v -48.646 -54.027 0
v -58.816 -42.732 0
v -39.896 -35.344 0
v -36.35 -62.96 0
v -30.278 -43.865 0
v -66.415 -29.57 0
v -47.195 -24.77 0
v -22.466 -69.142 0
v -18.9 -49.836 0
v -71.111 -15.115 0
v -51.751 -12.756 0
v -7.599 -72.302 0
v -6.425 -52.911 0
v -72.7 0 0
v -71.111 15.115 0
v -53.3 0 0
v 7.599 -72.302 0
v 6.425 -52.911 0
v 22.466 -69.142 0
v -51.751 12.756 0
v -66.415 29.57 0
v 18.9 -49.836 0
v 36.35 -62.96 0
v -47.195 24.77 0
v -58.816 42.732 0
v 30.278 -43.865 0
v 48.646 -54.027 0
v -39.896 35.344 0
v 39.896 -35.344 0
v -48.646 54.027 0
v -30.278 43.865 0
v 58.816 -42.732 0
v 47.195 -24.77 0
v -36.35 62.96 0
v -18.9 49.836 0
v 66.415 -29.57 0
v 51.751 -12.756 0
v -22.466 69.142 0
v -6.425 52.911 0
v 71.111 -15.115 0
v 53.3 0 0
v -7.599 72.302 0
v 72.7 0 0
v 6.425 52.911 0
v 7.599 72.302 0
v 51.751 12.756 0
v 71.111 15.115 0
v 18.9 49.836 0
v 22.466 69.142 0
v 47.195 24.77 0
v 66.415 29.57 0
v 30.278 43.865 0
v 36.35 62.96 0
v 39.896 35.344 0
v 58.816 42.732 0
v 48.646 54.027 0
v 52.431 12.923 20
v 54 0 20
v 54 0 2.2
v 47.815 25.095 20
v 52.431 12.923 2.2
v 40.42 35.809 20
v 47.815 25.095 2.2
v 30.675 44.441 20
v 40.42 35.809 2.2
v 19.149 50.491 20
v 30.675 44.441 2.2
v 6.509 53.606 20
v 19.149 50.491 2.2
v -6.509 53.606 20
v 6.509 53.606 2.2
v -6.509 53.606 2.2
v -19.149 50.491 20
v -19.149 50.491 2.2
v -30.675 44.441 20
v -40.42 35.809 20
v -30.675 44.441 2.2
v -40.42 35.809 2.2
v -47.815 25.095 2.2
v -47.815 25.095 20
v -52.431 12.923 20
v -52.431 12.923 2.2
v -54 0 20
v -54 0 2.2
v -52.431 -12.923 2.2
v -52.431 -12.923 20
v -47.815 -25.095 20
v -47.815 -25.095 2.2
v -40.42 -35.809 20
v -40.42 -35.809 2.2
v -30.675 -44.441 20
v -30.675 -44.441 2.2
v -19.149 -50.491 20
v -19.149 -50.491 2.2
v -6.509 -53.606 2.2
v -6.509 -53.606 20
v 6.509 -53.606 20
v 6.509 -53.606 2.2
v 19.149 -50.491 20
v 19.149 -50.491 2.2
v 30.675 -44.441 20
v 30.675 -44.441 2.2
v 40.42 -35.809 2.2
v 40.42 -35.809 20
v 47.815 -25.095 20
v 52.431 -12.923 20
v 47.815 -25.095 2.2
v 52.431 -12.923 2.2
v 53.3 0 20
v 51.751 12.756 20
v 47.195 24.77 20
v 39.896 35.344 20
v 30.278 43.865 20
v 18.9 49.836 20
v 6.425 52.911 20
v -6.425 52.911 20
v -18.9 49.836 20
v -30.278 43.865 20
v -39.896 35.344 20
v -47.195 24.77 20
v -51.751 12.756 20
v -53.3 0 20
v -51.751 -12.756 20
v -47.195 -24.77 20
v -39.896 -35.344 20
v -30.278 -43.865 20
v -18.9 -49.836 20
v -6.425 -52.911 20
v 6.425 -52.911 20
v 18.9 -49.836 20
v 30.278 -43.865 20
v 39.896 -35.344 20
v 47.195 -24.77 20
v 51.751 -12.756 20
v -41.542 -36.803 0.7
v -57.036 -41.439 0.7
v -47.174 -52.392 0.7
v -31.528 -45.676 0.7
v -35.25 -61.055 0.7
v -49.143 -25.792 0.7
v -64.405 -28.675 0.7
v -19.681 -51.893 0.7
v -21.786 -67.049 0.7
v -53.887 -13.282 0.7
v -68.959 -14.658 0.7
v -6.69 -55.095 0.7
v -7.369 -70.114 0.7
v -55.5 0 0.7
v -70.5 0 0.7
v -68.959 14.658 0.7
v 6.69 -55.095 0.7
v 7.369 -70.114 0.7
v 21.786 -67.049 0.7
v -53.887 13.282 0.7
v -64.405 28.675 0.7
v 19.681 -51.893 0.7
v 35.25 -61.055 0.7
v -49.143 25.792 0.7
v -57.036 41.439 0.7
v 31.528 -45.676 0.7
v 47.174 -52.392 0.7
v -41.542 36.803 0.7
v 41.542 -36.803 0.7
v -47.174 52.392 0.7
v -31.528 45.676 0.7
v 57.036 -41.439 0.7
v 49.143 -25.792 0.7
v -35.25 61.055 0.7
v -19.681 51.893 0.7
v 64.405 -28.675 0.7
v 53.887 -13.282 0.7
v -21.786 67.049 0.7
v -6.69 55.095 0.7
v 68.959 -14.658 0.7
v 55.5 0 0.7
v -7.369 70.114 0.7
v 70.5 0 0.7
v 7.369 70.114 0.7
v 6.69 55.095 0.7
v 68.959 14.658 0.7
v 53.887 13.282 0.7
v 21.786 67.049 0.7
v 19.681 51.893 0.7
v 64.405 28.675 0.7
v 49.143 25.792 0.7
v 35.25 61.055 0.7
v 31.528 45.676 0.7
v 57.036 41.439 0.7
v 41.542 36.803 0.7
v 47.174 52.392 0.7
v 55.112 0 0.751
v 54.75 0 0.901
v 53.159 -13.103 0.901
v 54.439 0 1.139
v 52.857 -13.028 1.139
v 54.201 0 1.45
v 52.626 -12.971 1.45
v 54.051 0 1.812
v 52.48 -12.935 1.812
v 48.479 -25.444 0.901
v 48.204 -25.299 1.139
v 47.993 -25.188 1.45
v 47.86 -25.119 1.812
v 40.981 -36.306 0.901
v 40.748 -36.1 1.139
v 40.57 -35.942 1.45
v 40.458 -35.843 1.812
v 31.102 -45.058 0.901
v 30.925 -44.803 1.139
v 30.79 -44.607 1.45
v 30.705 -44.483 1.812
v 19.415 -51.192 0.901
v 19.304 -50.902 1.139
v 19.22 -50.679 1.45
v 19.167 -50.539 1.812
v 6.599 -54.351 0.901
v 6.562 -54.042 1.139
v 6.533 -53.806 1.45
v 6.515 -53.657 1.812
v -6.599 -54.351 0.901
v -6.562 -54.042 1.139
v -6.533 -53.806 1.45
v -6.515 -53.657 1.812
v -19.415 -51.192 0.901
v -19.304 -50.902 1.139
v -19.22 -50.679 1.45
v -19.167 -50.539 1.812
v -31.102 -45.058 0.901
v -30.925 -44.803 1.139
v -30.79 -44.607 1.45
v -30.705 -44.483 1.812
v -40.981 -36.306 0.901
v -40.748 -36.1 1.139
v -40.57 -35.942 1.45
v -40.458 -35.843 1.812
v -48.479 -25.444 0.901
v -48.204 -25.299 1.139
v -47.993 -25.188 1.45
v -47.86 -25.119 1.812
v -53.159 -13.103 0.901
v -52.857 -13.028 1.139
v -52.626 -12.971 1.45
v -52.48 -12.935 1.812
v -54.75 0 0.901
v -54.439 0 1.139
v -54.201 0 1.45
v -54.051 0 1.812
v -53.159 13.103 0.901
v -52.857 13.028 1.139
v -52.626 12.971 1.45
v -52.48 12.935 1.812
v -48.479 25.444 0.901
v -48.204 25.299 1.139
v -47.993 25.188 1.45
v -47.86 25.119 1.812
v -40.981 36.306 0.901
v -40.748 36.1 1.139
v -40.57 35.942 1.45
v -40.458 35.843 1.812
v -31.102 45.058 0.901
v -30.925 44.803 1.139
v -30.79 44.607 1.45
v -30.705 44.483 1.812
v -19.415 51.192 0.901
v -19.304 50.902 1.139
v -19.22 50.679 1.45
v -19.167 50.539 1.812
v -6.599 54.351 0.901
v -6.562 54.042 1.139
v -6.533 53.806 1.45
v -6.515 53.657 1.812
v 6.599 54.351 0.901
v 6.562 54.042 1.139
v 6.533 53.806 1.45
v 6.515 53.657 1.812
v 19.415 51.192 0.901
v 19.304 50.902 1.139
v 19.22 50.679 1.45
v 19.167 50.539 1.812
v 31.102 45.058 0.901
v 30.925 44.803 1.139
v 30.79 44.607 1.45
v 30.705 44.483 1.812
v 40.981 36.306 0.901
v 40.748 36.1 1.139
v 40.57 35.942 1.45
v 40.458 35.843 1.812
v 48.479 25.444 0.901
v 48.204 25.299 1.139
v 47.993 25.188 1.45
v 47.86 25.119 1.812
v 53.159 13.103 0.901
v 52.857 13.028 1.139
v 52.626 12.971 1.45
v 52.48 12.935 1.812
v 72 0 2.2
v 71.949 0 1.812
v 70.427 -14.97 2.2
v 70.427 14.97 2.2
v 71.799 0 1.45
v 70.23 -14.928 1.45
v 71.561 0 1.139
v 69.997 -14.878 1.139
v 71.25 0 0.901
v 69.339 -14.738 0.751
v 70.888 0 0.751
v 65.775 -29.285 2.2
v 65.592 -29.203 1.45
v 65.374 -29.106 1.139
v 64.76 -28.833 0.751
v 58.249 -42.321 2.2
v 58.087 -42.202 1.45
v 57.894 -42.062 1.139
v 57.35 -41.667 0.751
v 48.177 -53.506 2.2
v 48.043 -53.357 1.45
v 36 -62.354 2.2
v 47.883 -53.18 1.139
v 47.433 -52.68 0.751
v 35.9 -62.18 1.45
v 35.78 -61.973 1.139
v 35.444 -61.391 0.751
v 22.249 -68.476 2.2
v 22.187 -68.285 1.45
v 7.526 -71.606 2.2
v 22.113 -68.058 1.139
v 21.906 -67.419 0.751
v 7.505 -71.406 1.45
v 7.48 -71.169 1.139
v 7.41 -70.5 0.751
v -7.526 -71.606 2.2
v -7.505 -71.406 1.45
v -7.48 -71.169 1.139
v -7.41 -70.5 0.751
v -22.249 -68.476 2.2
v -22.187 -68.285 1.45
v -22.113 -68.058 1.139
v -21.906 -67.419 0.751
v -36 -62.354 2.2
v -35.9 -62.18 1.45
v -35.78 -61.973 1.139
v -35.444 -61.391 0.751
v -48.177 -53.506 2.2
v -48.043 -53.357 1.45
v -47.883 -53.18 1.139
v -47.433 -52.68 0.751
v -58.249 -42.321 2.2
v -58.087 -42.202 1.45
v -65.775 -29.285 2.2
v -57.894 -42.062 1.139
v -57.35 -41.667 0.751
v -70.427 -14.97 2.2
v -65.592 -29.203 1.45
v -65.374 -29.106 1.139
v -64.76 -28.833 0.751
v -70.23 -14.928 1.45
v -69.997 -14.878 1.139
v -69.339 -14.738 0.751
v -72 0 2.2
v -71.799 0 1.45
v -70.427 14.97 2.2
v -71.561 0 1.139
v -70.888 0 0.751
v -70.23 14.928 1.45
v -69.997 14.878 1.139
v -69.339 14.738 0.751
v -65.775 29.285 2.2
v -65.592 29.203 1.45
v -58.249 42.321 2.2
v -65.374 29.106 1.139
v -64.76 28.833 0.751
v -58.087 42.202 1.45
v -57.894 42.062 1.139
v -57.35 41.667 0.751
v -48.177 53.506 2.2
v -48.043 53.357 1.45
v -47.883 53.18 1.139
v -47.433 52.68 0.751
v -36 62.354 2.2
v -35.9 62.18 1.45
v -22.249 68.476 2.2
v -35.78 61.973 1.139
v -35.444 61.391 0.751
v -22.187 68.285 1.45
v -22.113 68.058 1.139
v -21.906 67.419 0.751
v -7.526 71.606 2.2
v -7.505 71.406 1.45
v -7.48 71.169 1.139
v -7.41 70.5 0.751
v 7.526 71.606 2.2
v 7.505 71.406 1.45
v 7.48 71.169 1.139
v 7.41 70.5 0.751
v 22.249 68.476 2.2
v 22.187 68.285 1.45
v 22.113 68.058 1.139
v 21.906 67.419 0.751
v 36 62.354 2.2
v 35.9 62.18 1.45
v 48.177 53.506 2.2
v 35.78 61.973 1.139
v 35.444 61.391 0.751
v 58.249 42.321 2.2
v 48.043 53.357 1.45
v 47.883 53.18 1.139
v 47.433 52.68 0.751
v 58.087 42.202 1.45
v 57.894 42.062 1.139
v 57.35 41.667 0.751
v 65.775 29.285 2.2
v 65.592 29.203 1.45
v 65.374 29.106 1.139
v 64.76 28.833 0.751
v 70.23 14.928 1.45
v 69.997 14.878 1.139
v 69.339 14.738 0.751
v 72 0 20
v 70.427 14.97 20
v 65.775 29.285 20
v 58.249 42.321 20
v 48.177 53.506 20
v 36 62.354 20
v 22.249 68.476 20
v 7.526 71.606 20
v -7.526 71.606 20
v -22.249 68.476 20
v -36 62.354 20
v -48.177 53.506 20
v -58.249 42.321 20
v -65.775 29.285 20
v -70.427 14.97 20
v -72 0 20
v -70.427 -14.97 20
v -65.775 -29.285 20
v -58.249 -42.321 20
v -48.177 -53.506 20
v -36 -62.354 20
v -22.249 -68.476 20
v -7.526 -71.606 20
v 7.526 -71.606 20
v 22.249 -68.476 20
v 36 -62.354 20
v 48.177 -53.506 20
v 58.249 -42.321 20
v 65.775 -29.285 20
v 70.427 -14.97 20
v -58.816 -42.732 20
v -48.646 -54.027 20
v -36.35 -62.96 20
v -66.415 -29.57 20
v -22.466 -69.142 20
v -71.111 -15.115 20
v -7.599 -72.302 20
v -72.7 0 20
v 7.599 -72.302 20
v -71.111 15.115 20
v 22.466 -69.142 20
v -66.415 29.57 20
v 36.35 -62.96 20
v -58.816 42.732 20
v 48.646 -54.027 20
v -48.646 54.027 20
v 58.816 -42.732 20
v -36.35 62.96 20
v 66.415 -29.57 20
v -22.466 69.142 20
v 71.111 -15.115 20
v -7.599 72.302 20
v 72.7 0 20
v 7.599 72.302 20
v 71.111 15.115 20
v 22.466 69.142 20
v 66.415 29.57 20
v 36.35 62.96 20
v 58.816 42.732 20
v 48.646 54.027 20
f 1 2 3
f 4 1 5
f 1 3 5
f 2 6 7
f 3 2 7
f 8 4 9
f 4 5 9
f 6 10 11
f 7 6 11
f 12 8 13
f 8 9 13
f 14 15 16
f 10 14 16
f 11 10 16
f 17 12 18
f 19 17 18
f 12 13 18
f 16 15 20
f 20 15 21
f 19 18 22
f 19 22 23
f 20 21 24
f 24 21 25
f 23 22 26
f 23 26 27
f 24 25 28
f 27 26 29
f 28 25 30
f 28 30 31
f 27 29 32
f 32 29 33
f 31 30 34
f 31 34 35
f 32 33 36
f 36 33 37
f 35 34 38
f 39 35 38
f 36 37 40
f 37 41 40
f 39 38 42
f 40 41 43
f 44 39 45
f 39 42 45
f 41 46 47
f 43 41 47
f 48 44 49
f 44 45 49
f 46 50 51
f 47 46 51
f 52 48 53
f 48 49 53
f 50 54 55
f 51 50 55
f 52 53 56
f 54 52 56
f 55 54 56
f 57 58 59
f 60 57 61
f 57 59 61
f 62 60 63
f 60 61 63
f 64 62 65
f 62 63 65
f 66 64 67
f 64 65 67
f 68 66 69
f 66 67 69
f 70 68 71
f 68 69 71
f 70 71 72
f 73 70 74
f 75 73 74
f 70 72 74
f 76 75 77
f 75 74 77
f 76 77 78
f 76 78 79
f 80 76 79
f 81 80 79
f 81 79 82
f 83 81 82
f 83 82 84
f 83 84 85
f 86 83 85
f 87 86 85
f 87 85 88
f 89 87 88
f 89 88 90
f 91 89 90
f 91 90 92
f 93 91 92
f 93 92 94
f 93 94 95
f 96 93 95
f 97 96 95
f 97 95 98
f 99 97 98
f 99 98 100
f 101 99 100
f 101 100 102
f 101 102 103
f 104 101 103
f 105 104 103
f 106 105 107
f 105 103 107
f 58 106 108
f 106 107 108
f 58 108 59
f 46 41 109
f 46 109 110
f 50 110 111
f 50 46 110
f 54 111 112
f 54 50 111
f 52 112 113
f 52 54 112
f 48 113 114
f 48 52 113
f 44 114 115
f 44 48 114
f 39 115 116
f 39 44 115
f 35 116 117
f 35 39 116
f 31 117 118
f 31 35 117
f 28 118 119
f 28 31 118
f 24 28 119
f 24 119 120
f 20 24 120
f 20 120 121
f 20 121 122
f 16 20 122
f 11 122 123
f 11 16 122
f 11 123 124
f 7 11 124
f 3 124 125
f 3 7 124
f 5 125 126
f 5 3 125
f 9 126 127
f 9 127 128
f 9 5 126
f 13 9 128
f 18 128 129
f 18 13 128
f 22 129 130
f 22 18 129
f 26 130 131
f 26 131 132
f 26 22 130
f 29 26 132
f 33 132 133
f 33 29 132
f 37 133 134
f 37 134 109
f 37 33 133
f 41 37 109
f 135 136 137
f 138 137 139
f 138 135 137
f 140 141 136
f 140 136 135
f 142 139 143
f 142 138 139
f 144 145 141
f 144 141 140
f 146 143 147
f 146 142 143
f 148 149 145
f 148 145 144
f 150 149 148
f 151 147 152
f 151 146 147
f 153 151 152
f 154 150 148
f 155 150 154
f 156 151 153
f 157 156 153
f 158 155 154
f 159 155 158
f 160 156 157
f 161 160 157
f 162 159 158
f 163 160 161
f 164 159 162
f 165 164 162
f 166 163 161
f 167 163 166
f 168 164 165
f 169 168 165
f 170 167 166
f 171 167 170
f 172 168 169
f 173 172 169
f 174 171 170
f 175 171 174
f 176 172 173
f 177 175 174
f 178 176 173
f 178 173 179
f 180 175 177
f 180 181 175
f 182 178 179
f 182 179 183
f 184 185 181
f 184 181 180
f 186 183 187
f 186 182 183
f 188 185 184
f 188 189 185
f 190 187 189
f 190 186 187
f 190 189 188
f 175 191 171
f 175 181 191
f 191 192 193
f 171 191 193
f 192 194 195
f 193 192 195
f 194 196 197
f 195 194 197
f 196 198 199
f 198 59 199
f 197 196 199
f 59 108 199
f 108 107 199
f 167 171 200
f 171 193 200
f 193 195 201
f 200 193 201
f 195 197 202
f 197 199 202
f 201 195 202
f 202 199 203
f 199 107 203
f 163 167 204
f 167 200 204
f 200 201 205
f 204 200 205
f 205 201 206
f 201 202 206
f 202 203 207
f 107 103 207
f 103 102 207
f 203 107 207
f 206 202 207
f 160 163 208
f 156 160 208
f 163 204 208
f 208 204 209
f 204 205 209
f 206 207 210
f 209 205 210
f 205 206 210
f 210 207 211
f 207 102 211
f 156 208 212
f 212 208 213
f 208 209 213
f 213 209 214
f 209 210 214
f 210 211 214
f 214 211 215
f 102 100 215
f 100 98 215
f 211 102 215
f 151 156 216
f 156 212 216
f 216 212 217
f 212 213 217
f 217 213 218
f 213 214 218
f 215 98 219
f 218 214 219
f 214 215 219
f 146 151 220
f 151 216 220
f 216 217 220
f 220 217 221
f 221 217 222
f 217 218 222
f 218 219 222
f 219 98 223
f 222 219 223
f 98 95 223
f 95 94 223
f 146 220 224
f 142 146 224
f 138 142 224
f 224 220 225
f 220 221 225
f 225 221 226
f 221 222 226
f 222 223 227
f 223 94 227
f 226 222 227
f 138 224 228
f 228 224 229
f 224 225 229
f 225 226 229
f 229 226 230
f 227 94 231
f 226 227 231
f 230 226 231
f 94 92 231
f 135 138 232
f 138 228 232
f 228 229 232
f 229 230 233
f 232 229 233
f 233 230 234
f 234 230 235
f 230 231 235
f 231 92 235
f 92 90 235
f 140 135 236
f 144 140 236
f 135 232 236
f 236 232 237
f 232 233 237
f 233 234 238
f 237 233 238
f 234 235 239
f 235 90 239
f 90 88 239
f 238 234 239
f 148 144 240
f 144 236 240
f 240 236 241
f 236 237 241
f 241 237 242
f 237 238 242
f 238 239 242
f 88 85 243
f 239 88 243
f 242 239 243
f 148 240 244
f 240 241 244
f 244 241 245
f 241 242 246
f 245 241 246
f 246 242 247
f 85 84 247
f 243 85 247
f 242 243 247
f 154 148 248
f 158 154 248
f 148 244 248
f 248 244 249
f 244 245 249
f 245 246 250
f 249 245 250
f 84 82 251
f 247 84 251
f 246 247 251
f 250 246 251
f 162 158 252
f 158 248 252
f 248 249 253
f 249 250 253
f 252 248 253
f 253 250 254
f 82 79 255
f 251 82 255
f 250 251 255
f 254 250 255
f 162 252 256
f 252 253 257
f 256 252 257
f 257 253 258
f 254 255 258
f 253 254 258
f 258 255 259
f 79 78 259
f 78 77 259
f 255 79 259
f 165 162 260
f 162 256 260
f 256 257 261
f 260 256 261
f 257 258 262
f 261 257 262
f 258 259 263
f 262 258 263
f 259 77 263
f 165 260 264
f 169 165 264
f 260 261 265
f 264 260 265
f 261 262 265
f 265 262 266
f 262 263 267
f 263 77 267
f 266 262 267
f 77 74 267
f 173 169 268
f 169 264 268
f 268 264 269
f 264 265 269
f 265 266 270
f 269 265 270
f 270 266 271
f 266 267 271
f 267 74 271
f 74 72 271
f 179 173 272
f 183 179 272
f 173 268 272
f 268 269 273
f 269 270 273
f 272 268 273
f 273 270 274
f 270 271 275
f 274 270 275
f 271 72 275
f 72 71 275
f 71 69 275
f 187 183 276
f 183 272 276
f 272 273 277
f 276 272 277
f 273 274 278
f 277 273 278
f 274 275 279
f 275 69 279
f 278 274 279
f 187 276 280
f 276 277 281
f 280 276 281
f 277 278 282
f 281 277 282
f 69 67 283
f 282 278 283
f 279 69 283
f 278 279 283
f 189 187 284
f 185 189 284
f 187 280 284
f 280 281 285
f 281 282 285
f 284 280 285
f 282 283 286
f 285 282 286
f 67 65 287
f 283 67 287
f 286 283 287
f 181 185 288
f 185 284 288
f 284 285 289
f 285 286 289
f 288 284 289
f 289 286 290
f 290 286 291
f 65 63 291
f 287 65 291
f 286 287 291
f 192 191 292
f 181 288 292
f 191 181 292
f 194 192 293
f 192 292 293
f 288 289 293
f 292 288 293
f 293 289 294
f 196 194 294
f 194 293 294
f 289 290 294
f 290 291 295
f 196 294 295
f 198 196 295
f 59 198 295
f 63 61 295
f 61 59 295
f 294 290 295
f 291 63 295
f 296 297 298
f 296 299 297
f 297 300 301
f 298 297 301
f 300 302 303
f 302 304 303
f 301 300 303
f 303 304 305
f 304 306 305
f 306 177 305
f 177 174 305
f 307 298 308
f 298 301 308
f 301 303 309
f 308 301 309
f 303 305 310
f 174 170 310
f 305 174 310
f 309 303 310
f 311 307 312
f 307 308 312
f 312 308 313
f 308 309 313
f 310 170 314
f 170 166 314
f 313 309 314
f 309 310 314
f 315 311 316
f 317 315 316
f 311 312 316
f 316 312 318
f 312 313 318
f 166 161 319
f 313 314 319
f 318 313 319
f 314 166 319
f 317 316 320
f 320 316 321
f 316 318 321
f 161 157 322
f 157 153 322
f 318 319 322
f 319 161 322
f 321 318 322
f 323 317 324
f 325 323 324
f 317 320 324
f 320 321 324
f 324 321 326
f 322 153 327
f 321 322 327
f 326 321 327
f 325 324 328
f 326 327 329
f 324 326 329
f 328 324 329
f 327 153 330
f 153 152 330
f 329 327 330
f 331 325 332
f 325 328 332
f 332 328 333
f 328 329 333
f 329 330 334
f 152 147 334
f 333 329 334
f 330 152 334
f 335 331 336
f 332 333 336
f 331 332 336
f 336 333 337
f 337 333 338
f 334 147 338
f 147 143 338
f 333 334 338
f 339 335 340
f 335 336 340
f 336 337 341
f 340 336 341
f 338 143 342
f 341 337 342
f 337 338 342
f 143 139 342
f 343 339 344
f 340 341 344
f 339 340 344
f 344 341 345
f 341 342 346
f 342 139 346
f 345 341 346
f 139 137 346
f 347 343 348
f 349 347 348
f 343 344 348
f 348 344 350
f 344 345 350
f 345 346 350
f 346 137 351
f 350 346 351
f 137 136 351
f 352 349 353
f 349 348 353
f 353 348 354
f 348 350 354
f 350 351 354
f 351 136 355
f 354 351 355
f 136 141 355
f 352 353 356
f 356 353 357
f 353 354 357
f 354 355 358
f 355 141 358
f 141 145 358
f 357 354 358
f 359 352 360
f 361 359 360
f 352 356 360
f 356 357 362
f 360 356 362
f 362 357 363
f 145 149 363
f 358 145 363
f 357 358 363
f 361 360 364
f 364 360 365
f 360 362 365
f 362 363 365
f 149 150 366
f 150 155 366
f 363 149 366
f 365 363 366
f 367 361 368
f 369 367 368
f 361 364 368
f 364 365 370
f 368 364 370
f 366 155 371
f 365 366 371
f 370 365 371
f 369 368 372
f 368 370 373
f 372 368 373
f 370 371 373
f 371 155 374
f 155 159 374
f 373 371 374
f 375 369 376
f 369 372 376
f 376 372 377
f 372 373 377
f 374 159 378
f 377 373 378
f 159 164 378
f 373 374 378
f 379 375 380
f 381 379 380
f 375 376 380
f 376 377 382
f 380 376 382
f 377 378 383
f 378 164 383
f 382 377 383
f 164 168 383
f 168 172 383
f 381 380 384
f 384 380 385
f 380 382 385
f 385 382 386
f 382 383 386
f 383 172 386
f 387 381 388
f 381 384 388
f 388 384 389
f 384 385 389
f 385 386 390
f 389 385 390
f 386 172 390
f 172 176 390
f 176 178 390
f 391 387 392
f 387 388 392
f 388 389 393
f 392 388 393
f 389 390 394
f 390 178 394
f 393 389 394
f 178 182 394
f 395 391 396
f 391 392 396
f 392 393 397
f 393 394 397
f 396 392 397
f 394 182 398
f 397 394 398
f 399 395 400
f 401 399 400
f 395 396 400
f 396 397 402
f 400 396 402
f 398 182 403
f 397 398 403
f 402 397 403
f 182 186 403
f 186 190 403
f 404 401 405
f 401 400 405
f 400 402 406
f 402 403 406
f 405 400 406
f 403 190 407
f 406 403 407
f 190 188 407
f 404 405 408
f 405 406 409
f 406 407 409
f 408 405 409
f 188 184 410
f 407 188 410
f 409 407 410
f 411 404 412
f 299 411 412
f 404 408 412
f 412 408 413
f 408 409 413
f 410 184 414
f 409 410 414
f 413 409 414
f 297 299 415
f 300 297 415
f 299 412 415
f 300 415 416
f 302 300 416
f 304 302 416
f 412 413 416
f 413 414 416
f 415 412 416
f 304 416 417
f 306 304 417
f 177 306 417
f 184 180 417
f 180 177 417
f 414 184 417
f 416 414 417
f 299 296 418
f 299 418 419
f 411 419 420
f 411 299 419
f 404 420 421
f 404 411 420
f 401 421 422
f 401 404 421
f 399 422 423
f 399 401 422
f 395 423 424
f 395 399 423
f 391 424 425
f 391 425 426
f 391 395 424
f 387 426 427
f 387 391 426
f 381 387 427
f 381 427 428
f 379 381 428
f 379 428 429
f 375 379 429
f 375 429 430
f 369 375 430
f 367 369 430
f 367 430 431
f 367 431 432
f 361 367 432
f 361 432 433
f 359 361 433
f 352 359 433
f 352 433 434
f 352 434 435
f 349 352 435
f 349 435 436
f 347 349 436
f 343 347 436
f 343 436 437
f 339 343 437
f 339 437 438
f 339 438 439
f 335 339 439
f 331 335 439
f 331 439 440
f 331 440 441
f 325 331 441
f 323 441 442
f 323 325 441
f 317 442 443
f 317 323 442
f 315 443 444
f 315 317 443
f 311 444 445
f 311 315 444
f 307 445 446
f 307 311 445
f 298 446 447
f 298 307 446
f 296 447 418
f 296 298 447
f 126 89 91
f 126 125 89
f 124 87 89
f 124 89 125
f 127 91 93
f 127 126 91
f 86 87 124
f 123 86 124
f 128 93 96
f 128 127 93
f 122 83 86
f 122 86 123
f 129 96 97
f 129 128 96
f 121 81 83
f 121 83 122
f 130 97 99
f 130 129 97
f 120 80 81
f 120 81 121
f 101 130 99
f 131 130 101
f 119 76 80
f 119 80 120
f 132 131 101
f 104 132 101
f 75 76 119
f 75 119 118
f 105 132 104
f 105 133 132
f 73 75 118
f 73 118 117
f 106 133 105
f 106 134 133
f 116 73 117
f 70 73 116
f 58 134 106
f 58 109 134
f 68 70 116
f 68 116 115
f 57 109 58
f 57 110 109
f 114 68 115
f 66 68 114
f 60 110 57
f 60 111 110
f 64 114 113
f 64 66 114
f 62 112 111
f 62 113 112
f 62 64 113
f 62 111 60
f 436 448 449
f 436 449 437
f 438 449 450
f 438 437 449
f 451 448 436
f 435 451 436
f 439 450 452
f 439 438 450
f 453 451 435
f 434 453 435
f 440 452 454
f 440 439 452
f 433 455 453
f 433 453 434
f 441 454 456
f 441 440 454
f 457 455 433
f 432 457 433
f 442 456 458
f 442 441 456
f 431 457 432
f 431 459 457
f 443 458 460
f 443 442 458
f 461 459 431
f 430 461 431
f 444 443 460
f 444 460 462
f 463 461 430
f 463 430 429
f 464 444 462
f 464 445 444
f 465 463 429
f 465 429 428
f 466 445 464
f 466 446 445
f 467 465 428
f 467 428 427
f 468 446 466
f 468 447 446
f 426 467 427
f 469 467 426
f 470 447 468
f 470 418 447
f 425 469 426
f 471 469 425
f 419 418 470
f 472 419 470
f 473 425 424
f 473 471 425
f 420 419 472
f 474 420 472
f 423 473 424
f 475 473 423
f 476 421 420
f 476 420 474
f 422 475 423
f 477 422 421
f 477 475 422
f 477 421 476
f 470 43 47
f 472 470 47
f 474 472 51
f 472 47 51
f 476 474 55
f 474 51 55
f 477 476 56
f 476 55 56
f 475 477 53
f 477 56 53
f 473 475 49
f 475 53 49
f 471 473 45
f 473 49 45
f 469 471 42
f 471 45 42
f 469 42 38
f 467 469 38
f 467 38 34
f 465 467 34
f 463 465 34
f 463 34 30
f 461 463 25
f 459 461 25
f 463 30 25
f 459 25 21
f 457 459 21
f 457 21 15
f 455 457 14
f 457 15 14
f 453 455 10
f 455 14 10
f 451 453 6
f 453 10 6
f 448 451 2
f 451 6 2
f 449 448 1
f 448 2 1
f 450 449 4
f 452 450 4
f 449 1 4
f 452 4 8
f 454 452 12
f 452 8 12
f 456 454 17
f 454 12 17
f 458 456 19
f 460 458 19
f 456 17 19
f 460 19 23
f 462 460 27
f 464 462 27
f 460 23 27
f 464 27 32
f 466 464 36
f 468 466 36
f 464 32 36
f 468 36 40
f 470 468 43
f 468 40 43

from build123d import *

# Parameters (mm, degrees)
F0_R     = 72.7
F0_R_2   = 53.3
F1_DEPTH = 20
F2_T     = -0.7
F3_R     = 1.5


with BuildPart() as f1:
    # F0 (on Top) → F1 (new body)
    with BuildSketch(Plane.XY):
        Circle(F0_R)
        Circle(F0_R_2, mode=Mode.SUBTRACT)
    extrude(amount=F1_DEPTH)

    # F2
    f2_openings = [f1.faces().sort_by_distance(p)[0] for p in [
        (-70.643733, 0, 20),
    ]]
    offset(amount=F2_T, openings=f2_openings)

    # F3
    f3_edges = [f1.edges().sort_by_distance(p)[0] for p in [
        (-72, 0, 0.7),
        (-54, 0, 0.7),
    ]]
    fillet(f3_edges, radius=F3_R)


solid = f1.part
